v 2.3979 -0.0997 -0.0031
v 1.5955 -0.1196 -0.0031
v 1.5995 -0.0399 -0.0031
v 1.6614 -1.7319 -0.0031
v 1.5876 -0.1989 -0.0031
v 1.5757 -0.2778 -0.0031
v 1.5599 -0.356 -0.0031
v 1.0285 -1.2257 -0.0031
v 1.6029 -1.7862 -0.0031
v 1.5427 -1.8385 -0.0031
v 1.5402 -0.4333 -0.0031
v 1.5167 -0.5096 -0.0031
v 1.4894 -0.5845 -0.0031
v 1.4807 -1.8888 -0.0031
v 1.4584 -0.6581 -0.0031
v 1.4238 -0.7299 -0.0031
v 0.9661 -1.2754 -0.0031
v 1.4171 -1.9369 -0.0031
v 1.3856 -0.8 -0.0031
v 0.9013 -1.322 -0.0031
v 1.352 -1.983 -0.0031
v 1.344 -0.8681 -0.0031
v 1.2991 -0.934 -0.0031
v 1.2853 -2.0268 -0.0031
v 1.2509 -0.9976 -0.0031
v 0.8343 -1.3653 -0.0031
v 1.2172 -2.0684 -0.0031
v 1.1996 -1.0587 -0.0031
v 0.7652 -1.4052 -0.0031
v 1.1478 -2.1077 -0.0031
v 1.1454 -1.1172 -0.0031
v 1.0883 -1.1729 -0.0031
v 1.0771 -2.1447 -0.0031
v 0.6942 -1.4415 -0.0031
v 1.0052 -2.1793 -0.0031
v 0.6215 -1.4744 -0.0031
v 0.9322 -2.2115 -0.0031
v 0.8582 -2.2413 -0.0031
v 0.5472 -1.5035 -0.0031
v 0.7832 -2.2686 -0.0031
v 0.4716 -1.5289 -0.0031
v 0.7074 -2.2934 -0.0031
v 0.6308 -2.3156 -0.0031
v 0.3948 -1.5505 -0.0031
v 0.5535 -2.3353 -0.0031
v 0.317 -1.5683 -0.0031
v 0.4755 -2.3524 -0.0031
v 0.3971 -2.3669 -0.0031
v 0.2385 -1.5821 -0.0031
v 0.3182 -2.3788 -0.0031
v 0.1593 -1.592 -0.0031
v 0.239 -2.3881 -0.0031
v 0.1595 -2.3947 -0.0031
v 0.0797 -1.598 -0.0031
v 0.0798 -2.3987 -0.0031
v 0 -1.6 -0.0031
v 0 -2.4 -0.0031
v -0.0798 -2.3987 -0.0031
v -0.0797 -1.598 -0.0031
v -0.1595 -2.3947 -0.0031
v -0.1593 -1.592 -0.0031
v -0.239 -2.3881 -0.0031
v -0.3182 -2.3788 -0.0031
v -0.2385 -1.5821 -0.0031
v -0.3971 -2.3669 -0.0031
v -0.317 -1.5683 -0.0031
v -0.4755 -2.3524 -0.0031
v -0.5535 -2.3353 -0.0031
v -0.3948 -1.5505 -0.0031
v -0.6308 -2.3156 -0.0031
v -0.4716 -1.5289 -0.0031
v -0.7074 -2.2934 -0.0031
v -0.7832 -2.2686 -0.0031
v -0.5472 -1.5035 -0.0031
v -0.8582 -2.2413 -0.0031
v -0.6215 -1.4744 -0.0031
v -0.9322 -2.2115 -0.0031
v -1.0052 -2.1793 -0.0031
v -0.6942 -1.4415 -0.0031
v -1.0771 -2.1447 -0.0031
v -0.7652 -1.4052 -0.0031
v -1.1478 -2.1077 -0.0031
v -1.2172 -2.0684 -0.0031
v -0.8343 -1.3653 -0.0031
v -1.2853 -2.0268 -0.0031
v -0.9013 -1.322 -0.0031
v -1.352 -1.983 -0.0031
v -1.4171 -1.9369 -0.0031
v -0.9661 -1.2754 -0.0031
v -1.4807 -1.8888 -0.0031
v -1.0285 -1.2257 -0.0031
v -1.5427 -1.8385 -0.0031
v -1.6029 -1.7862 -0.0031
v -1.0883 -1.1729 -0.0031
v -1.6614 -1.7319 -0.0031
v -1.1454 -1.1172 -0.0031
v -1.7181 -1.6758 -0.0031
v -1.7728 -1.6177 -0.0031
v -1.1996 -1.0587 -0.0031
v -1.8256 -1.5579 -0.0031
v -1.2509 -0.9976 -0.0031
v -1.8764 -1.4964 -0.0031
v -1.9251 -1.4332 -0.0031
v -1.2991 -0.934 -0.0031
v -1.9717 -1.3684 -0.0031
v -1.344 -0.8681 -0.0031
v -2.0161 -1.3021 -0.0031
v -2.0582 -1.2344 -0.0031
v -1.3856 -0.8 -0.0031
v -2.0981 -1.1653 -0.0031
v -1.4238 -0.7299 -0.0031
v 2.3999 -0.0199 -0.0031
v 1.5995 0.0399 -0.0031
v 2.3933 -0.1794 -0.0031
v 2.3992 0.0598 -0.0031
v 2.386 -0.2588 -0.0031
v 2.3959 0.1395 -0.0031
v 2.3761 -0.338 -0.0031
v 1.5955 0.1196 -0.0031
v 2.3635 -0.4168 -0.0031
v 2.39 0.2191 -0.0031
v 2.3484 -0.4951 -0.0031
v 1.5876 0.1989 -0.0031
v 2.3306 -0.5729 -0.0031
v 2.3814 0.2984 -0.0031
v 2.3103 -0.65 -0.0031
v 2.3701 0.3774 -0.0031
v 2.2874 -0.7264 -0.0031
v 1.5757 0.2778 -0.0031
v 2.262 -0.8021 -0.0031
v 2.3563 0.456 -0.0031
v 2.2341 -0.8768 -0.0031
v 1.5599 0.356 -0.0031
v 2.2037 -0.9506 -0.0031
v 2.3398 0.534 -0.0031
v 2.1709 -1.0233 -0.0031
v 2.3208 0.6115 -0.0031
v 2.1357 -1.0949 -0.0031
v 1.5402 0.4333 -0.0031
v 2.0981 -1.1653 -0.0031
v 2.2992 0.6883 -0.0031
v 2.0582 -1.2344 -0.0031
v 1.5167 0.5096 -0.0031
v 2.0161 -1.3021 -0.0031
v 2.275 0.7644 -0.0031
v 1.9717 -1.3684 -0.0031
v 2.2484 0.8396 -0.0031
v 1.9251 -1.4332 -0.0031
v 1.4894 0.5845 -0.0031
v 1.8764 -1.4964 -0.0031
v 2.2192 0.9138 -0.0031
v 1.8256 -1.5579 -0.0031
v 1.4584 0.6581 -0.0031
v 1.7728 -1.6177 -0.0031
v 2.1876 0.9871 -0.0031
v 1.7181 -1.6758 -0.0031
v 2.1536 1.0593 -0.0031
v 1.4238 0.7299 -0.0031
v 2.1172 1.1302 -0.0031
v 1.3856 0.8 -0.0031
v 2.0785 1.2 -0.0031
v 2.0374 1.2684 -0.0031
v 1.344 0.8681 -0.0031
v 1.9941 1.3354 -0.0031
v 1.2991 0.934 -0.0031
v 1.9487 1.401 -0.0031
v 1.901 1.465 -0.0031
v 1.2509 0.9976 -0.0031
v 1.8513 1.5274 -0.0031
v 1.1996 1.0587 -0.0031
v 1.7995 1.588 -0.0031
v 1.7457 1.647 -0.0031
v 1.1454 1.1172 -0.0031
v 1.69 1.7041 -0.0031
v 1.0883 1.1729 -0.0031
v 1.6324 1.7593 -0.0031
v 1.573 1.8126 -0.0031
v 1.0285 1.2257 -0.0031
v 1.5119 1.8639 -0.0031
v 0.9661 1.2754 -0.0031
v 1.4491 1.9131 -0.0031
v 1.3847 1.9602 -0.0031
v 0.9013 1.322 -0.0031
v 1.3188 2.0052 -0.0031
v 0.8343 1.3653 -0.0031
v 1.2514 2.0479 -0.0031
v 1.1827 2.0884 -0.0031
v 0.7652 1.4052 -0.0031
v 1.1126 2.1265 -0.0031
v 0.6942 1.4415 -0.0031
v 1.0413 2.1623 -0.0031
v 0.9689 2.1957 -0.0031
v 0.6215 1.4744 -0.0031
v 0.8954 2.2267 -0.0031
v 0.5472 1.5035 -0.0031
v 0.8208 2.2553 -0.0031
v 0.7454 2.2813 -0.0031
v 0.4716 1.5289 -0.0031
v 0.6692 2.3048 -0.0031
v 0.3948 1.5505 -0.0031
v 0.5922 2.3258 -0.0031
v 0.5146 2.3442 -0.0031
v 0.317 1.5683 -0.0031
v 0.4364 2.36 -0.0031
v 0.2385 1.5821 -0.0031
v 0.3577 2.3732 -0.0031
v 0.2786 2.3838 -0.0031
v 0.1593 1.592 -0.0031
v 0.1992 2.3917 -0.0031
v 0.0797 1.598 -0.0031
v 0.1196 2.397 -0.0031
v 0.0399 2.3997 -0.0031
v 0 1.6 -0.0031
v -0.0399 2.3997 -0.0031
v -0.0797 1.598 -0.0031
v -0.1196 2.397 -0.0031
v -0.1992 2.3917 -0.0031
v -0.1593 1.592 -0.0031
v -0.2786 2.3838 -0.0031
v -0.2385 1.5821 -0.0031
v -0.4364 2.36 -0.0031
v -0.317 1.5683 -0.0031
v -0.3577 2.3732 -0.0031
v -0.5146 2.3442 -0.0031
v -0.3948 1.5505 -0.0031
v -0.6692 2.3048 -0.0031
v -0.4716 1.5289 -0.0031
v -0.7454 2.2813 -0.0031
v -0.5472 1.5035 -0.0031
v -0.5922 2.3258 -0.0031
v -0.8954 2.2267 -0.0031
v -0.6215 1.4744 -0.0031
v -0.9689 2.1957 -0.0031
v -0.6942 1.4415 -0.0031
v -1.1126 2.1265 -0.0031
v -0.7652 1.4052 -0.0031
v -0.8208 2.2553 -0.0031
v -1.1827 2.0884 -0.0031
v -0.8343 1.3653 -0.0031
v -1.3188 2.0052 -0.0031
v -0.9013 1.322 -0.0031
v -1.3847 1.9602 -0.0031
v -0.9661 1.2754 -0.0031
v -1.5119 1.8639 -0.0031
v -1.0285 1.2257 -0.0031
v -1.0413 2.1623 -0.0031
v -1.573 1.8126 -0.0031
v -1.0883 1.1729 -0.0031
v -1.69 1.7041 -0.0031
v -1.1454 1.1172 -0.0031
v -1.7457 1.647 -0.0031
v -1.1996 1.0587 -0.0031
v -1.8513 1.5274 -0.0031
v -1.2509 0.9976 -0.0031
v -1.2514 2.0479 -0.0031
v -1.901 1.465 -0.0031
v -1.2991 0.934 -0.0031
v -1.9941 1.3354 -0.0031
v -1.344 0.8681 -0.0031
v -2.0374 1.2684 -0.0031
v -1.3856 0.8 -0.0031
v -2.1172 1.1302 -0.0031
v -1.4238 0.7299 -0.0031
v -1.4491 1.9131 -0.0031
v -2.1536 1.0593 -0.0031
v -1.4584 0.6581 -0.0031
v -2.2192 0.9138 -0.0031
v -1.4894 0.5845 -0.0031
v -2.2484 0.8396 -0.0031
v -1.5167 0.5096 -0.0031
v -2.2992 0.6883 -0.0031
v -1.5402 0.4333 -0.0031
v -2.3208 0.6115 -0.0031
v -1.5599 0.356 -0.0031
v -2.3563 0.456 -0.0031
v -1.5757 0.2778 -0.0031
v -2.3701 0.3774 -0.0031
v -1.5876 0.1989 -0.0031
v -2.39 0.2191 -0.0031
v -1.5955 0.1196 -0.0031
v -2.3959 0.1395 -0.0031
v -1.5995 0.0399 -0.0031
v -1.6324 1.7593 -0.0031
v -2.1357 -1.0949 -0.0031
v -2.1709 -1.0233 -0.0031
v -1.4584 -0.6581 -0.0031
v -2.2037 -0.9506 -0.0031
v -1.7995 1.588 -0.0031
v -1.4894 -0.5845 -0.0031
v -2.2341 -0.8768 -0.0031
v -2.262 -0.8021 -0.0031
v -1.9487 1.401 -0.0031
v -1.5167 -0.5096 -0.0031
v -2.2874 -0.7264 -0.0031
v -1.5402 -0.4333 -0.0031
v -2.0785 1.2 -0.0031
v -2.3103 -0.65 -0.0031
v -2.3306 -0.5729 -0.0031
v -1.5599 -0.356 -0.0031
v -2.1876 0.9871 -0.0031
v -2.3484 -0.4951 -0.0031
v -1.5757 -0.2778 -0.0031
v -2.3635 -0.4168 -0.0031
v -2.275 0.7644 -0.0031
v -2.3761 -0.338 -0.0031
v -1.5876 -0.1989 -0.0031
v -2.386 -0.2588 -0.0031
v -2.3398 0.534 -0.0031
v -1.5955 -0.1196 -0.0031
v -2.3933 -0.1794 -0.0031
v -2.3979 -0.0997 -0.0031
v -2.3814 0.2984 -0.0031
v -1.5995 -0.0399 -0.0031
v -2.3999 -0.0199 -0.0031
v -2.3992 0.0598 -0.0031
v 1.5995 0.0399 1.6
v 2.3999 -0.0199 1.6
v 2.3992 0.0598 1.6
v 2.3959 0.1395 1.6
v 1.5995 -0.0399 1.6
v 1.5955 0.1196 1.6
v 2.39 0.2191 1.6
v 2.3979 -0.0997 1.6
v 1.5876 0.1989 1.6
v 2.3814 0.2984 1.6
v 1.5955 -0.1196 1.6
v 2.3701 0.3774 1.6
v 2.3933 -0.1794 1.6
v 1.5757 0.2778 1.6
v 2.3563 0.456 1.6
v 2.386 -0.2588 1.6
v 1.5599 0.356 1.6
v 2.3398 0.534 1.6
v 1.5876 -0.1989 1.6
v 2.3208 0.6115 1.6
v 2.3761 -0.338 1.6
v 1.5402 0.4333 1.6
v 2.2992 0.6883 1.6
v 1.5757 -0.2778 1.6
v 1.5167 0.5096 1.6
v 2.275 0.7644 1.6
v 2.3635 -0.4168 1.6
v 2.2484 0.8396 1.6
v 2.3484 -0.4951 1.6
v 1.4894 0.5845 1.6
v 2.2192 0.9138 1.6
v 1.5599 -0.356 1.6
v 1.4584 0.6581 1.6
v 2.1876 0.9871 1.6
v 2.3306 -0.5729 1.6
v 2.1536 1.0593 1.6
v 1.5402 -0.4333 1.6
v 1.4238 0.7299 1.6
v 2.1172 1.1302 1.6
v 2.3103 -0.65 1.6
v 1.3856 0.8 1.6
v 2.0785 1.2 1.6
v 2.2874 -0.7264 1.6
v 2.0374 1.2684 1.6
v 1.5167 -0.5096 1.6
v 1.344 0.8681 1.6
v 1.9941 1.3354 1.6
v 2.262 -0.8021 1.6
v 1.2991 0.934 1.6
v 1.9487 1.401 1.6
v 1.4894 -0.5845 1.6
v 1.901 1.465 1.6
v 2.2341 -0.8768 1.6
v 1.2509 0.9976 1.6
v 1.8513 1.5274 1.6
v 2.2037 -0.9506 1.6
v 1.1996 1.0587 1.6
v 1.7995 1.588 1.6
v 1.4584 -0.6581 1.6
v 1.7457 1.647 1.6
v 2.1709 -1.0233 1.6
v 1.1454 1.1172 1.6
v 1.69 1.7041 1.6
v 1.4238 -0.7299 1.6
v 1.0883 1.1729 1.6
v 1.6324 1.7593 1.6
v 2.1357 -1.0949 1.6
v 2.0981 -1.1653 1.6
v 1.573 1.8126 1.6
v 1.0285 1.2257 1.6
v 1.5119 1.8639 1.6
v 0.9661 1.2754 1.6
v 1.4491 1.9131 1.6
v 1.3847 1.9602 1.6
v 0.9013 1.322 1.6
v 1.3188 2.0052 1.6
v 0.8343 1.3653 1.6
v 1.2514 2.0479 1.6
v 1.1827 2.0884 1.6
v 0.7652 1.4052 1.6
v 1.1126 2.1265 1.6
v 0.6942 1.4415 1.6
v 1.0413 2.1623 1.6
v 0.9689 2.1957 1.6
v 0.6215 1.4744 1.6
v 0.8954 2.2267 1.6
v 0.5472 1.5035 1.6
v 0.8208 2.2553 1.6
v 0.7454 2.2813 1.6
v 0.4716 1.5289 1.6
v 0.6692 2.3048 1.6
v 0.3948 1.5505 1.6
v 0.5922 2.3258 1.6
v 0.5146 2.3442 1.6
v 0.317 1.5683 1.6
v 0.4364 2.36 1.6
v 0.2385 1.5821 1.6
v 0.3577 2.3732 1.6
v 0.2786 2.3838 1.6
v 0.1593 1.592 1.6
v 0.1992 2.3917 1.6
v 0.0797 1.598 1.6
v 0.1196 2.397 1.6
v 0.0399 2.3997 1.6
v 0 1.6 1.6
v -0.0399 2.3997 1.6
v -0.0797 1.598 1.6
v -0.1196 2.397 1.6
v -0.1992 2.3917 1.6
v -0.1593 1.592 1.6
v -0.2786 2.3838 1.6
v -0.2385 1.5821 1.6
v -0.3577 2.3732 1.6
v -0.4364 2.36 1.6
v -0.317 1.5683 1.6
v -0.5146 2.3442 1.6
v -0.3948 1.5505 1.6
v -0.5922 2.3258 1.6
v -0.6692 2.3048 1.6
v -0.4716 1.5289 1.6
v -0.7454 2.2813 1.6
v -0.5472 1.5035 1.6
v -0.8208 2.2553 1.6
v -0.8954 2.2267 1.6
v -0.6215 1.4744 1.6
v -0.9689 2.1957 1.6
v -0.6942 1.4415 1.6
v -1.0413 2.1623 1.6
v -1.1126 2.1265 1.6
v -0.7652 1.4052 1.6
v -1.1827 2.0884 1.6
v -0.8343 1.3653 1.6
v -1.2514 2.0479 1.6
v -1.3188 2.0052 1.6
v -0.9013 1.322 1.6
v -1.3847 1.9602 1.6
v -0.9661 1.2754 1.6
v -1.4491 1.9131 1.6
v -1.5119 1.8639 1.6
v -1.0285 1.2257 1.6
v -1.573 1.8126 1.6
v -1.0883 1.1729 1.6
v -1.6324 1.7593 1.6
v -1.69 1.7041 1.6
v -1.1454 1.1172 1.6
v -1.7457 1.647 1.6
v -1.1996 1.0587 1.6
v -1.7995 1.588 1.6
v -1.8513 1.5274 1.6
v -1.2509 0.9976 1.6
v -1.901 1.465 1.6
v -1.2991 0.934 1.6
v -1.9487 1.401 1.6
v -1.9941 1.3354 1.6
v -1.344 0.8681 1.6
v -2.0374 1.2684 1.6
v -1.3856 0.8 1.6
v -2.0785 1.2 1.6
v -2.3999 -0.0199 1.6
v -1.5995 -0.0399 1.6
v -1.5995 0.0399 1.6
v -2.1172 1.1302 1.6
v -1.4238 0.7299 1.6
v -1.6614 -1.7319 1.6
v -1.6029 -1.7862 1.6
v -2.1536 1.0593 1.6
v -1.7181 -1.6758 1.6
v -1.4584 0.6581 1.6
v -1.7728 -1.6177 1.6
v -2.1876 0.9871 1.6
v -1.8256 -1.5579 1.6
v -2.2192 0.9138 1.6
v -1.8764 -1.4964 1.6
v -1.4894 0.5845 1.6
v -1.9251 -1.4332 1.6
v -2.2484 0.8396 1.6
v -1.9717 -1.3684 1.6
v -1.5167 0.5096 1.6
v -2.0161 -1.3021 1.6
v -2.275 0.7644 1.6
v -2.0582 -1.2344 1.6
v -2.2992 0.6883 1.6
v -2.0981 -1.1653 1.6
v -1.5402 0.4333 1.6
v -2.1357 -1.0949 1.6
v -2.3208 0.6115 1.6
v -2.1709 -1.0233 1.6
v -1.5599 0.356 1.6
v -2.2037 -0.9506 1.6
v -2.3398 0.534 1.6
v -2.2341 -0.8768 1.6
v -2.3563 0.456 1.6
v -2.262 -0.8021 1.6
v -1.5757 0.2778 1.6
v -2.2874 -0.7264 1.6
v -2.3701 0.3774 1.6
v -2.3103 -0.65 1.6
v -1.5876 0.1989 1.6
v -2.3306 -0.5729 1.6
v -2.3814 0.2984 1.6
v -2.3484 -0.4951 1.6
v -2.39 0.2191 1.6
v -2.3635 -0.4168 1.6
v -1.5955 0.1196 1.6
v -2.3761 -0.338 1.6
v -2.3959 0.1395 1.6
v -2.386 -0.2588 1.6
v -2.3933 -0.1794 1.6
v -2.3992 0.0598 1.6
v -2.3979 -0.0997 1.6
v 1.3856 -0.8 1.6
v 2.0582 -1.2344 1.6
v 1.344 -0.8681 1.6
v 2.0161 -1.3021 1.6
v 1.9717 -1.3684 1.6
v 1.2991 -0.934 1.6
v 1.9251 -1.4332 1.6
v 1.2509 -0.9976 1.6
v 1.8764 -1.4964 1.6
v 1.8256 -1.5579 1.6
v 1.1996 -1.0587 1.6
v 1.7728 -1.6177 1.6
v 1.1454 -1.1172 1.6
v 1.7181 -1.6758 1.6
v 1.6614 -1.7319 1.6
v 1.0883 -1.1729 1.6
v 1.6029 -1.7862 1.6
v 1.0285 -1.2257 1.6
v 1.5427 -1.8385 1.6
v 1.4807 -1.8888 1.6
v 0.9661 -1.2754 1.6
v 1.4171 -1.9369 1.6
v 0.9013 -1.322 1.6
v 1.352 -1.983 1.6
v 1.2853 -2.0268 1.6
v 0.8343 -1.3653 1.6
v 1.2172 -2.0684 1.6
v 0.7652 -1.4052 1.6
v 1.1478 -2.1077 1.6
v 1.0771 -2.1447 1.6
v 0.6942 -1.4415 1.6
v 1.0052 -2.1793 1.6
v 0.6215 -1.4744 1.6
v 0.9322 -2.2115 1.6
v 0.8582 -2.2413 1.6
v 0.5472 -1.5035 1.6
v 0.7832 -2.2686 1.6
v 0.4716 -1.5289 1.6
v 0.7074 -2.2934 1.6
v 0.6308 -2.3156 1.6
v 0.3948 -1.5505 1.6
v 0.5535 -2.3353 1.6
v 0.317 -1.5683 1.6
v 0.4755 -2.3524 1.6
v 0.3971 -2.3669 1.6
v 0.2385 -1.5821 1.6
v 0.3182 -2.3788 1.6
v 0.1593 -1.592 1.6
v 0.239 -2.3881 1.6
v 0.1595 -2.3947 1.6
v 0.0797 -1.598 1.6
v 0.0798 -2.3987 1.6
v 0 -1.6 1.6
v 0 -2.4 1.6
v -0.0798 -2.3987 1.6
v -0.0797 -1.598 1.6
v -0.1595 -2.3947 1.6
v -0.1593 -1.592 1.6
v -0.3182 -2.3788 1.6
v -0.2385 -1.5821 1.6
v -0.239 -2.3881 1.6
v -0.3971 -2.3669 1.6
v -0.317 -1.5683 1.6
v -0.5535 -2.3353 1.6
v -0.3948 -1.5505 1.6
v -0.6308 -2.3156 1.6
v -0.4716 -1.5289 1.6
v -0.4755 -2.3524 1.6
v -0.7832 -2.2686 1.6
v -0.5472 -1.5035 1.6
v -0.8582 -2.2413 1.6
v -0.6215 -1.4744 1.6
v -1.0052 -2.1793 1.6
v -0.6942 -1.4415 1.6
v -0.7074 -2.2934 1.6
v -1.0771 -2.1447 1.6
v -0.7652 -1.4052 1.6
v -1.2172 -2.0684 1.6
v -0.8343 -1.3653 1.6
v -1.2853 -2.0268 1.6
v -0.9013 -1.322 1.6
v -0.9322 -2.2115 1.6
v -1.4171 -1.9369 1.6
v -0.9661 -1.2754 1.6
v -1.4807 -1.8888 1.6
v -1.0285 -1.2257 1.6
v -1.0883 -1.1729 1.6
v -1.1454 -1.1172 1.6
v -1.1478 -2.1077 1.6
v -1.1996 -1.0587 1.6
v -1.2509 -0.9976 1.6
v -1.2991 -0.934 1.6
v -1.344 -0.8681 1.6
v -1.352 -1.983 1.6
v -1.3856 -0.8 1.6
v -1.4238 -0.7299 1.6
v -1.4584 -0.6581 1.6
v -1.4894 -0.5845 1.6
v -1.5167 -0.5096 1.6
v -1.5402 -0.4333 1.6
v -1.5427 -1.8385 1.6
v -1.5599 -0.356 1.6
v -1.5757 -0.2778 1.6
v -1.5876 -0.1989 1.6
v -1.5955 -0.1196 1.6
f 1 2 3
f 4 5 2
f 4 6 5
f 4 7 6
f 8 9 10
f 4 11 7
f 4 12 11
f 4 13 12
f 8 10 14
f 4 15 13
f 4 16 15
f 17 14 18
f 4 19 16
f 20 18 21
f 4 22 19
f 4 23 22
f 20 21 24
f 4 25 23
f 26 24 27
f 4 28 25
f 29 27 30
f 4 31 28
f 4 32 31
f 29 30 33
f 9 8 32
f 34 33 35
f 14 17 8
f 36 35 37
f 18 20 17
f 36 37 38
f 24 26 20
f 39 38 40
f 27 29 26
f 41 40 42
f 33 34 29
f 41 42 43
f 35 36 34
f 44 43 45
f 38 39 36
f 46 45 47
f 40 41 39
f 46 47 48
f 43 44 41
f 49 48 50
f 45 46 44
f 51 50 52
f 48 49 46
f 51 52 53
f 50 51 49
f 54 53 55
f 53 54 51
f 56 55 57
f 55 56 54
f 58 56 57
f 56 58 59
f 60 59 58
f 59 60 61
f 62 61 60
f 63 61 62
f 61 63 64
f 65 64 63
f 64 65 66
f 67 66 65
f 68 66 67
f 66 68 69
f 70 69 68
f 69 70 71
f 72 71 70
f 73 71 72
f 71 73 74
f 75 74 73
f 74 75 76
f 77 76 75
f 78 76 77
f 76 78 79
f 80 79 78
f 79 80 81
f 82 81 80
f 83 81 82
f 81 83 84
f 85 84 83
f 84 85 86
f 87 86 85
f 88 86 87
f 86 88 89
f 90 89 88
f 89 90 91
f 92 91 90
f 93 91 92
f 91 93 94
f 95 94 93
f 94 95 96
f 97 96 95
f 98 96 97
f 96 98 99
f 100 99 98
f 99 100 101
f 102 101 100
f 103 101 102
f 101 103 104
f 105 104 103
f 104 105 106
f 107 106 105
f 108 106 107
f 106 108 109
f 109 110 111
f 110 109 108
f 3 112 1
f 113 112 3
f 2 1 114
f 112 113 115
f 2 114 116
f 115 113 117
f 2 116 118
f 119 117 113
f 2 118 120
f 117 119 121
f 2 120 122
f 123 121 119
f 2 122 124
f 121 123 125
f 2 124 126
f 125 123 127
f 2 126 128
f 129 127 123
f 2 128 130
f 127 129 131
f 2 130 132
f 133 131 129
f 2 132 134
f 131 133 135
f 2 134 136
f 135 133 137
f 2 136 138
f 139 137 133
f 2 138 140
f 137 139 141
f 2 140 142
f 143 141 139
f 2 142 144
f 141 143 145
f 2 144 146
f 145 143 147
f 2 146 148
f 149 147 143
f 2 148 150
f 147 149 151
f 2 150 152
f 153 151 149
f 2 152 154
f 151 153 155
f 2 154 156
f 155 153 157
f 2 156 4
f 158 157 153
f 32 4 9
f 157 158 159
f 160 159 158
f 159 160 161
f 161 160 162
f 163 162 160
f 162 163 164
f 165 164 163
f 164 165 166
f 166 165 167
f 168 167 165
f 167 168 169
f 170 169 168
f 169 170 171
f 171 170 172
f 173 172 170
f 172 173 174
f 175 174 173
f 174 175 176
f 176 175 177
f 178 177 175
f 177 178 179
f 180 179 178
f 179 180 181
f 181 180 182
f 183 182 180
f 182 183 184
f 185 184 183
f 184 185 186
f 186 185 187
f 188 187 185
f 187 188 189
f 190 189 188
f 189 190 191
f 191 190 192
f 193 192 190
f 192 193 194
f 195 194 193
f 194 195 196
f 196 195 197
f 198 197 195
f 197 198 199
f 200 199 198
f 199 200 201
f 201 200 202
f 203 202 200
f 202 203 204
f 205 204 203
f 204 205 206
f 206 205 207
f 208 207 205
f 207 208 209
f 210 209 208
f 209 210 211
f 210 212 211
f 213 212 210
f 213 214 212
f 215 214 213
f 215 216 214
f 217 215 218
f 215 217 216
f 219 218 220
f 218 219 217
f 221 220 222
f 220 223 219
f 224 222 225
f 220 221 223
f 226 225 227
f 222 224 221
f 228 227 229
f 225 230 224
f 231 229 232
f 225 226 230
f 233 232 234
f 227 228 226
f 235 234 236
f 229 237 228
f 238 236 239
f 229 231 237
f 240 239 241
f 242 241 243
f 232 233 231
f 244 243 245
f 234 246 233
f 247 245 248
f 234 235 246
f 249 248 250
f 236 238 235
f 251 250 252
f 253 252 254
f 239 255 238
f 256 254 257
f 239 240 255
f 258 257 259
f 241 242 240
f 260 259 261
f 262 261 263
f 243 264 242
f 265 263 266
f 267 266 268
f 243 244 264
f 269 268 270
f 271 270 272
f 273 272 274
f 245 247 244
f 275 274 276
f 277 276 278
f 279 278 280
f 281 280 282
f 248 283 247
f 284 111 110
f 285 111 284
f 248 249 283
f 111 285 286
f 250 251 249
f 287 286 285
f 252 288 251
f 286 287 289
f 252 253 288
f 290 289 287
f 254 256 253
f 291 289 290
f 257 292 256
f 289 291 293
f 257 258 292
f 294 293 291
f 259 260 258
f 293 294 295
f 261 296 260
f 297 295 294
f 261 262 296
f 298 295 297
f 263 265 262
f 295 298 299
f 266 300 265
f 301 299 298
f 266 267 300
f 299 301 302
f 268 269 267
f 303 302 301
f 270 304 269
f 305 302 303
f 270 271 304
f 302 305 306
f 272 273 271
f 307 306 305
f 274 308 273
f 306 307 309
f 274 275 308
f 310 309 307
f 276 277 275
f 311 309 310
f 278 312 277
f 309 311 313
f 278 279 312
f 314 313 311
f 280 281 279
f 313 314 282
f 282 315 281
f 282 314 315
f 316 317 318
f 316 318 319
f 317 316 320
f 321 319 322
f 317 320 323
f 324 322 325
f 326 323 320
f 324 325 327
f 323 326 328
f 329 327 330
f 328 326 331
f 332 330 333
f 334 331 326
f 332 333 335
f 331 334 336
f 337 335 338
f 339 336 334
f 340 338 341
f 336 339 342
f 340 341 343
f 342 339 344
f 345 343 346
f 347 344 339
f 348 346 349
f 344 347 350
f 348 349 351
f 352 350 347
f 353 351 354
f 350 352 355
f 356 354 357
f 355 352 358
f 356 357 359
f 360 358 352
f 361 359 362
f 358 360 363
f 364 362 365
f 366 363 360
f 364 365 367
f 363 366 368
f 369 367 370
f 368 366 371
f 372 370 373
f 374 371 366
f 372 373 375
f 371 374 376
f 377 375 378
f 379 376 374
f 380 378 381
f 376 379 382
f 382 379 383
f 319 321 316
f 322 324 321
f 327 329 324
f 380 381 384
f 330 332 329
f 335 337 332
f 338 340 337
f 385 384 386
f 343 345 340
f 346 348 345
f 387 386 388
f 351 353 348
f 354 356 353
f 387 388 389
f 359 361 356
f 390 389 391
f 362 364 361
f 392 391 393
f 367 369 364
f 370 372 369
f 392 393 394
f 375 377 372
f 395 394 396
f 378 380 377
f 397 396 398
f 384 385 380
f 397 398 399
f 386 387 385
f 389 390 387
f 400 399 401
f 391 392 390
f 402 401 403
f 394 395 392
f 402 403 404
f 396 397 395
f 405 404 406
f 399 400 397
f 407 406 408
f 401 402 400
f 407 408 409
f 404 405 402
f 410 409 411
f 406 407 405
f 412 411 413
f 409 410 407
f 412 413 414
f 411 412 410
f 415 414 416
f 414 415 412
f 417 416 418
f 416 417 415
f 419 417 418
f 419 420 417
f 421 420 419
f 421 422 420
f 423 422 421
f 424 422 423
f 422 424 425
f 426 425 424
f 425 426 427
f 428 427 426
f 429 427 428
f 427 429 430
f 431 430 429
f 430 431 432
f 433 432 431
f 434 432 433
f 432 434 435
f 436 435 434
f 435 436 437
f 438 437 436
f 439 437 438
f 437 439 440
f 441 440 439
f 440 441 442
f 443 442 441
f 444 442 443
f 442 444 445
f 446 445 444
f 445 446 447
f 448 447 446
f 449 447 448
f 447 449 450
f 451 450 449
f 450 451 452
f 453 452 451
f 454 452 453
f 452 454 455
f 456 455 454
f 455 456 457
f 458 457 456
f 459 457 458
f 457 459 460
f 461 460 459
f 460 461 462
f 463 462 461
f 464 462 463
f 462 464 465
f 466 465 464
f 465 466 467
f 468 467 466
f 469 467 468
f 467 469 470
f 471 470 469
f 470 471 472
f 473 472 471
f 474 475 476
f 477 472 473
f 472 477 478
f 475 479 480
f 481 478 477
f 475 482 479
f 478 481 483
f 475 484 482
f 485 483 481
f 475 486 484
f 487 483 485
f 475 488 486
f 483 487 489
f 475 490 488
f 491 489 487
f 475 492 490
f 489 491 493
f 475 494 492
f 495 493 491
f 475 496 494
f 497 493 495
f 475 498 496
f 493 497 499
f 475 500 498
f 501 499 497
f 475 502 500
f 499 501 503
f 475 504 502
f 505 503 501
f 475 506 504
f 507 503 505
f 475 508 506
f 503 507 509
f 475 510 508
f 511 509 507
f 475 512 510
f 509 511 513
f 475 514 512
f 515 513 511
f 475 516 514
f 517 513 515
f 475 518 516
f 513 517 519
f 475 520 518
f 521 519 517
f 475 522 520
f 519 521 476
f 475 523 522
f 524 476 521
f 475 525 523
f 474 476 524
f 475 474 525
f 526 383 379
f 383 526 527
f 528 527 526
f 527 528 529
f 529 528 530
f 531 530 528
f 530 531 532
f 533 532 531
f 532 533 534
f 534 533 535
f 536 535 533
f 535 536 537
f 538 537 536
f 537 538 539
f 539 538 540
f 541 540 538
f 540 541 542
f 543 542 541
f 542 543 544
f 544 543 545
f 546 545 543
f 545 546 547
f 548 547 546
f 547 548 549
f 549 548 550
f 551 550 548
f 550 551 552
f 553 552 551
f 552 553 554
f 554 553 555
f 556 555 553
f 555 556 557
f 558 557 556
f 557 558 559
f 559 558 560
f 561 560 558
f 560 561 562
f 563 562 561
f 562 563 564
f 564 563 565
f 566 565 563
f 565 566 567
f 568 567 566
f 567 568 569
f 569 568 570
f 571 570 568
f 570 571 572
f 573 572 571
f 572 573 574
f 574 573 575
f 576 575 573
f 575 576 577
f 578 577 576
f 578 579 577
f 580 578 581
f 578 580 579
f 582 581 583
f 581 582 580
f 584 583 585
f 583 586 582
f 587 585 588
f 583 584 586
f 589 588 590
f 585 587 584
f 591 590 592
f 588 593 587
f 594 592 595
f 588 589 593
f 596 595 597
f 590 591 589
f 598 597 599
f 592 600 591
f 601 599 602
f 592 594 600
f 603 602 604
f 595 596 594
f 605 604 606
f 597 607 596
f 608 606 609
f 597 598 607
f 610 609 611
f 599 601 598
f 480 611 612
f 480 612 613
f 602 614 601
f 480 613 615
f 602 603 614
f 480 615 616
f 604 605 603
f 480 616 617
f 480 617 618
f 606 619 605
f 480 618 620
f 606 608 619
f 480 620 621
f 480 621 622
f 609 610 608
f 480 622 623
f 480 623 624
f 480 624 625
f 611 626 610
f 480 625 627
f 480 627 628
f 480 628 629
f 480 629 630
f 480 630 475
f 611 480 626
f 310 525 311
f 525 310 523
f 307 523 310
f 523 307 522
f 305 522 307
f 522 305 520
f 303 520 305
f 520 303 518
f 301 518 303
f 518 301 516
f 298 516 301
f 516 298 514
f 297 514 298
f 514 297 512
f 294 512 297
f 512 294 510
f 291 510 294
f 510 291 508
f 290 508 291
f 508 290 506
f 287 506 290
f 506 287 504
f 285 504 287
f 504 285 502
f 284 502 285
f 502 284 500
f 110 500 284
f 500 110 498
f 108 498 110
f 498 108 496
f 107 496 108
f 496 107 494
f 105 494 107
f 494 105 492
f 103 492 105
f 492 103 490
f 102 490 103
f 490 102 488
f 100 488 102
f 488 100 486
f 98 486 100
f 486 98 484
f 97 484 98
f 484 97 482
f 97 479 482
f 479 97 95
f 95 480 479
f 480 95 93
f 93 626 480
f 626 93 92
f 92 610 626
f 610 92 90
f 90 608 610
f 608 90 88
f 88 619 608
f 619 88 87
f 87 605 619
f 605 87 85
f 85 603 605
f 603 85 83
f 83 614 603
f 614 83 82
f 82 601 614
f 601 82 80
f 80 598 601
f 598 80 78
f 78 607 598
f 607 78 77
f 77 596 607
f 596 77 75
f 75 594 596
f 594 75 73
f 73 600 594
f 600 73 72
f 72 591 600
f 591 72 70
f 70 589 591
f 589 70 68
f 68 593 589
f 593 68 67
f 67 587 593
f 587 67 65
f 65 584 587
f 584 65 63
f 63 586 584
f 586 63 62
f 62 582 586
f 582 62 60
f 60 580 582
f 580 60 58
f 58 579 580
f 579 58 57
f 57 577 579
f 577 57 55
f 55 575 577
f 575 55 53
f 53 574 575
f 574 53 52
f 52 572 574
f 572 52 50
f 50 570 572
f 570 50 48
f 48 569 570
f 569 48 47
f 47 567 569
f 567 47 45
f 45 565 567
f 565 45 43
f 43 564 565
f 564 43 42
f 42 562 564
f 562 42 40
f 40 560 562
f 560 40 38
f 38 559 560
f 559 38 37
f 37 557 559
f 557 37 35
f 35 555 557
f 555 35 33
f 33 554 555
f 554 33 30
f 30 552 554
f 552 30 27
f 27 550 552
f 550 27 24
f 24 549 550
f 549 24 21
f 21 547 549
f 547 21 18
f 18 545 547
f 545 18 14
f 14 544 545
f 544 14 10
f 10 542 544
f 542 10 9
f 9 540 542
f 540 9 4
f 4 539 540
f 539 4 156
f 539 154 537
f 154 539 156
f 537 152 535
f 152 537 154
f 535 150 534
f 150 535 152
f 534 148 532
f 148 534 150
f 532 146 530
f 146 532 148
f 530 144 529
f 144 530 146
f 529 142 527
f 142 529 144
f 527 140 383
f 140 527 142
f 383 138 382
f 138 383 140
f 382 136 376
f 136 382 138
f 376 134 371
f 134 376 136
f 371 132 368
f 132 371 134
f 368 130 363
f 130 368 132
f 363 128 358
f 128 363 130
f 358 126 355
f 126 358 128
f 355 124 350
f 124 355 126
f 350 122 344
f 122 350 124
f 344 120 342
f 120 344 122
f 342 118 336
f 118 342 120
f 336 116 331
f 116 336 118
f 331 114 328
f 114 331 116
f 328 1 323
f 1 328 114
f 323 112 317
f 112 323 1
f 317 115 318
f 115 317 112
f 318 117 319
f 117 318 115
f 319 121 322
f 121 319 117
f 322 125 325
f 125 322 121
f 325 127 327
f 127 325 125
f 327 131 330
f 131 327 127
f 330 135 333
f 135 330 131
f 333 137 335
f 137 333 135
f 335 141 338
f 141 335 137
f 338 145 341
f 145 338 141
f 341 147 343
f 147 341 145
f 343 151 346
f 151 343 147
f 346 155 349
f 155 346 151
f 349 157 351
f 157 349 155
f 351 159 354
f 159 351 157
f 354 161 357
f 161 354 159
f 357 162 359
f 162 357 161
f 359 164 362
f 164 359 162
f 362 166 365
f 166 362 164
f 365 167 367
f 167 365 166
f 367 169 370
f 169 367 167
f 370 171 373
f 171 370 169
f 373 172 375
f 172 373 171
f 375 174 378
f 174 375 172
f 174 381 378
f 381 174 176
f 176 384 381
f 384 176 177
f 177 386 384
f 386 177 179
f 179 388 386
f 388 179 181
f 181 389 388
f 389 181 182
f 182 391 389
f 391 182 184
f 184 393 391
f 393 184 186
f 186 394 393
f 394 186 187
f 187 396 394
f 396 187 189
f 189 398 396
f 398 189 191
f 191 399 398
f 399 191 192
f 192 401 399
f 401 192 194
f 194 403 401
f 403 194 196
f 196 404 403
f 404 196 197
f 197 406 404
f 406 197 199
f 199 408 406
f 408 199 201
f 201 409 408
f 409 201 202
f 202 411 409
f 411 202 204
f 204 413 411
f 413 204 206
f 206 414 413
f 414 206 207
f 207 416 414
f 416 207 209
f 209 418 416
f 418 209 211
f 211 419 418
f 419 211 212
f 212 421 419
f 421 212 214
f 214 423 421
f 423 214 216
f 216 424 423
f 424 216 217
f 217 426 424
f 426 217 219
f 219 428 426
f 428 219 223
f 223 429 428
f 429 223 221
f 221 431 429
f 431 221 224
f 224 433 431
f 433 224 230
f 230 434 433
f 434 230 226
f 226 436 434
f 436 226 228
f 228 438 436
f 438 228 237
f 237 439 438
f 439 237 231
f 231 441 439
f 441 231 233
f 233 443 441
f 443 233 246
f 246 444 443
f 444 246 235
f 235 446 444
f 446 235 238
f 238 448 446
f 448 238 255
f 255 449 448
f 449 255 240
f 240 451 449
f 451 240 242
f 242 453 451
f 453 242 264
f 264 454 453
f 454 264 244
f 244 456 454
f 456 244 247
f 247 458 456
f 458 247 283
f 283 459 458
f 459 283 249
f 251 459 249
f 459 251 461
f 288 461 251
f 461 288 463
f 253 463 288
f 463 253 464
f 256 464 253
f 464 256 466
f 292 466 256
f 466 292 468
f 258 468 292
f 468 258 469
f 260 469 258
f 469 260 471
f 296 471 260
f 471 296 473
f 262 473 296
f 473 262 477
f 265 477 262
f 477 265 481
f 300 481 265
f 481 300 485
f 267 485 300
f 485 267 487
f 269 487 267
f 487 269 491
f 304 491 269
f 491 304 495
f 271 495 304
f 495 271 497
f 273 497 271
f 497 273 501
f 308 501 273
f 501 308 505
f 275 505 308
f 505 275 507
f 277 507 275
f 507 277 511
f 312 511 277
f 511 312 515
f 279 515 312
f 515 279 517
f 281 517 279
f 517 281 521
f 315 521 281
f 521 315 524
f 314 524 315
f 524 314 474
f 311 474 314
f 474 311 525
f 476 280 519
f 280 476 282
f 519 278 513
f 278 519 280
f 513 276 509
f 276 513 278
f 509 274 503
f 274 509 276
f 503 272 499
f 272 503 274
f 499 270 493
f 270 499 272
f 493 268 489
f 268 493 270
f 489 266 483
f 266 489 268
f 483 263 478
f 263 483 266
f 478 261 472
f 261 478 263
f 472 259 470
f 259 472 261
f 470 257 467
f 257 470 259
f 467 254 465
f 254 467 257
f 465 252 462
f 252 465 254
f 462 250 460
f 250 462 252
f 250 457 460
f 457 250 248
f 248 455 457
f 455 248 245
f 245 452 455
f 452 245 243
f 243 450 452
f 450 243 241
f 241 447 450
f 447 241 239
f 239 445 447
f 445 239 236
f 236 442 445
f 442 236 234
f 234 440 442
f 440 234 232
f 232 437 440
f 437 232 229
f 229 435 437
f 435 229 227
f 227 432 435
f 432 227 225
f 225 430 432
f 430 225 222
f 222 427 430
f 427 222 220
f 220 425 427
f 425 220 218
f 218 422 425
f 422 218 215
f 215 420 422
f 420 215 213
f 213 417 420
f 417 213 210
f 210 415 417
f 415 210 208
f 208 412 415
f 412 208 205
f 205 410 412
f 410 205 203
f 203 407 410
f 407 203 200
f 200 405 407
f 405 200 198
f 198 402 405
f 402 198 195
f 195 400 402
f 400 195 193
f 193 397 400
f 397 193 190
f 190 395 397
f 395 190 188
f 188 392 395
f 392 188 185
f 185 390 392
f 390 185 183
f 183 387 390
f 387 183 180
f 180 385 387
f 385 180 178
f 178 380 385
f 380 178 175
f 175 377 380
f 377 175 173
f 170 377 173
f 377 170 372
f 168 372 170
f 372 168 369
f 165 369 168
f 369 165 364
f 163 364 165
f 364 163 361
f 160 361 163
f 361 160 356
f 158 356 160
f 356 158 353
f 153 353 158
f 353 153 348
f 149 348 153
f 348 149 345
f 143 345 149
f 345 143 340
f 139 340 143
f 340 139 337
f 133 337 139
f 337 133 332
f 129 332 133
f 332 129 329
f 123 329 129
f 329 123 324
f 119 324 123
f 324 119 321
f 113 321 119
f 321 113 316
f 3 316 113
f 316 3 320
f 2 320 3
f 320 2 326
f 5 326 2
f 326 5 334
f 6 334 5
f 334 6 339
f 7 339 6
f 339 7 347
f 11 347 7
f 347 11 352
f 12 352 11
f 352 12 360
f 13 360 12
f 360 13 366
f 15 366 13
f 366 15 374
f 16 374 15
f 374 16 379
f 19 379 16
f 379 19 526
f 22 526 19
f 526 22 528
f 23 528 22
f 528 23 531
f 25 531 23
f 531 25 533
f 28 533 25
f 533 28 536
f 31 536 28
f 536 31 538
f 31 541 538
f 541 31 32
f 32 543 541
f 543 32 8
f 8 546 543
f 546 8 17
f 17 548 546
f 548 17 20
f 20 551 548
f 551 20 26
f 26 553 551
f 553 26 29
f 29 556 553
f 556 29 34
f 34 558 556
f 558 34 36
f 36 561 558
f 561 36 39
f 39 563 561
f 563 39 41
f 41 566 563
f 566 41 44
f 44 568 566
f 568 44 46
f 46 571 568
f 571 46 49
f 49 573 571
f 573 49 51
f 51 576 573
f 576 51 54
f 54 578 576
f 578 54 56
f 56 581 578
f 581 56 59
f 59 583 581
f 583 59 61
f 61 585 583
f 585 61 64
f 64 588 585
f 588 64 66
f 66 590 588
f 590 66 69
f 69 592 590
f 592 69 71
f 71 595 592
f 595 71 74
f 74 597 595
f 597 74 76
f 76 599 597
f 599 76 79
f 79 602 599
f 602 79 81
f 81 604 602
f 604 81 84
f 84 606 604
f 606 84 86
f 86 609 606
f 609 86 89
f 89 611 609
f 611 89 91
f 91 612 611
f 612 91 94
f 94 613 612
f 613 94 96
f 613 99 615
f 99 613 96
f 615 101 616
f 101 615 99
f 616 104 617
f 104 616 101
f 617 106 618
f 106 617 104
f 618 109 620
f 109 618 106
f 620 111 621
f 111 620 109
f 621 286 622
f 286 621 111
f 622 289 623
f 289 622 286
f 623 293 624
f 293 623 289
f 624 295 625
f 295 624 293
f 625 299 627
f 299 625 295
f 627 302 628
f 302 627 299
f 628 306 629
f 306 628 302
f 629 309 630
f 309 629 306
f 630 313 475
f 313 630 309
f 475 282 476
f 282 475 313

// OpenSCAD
use <../lib.scad>
use <3755a.scad>
$fa=1; $fs=0.2;
function ldraw_lib__3755(realsolid=false) = [
// 0 ~Moved to 3755a
// 0 Name: 3755.dat
// 0 Author: [PTadmin]
// 0 !LDRAW_ORG Part UPDATE 2020-02
// 0 !LICENSE Licensed under CC BY 4.0 : see CAreadme.txt
// 
// 0 BFC CERTIFY CCW
  [0,"BFC","CERTIFY"],
  [0,"BFC","CCW"],
// 
// 0 !HISTORY 2020-09-05 [PTadmin] Official Update 2020-02
// 
// 
// 0 // Brick 1 x 3 x 5
// 1 16 0 0 0 1 0 0 0 1 0 0 0 1 3755a.dat
  [1,16,0,0,0,1,0,0,0,1,0,0,0,1, ldraw_lib__3755a(realsolid)],
];
module ldraw_lib__3755(step=0, col=false, unit=2/5, alt=false, line=0.2, solid=!$preview)
    makepoly(ldraw_lib__3755(solid), step=step, col=col, unit=unit, alt=alt, line=line, solid=solid);
ldraw_lib__3755(line=0.2);
